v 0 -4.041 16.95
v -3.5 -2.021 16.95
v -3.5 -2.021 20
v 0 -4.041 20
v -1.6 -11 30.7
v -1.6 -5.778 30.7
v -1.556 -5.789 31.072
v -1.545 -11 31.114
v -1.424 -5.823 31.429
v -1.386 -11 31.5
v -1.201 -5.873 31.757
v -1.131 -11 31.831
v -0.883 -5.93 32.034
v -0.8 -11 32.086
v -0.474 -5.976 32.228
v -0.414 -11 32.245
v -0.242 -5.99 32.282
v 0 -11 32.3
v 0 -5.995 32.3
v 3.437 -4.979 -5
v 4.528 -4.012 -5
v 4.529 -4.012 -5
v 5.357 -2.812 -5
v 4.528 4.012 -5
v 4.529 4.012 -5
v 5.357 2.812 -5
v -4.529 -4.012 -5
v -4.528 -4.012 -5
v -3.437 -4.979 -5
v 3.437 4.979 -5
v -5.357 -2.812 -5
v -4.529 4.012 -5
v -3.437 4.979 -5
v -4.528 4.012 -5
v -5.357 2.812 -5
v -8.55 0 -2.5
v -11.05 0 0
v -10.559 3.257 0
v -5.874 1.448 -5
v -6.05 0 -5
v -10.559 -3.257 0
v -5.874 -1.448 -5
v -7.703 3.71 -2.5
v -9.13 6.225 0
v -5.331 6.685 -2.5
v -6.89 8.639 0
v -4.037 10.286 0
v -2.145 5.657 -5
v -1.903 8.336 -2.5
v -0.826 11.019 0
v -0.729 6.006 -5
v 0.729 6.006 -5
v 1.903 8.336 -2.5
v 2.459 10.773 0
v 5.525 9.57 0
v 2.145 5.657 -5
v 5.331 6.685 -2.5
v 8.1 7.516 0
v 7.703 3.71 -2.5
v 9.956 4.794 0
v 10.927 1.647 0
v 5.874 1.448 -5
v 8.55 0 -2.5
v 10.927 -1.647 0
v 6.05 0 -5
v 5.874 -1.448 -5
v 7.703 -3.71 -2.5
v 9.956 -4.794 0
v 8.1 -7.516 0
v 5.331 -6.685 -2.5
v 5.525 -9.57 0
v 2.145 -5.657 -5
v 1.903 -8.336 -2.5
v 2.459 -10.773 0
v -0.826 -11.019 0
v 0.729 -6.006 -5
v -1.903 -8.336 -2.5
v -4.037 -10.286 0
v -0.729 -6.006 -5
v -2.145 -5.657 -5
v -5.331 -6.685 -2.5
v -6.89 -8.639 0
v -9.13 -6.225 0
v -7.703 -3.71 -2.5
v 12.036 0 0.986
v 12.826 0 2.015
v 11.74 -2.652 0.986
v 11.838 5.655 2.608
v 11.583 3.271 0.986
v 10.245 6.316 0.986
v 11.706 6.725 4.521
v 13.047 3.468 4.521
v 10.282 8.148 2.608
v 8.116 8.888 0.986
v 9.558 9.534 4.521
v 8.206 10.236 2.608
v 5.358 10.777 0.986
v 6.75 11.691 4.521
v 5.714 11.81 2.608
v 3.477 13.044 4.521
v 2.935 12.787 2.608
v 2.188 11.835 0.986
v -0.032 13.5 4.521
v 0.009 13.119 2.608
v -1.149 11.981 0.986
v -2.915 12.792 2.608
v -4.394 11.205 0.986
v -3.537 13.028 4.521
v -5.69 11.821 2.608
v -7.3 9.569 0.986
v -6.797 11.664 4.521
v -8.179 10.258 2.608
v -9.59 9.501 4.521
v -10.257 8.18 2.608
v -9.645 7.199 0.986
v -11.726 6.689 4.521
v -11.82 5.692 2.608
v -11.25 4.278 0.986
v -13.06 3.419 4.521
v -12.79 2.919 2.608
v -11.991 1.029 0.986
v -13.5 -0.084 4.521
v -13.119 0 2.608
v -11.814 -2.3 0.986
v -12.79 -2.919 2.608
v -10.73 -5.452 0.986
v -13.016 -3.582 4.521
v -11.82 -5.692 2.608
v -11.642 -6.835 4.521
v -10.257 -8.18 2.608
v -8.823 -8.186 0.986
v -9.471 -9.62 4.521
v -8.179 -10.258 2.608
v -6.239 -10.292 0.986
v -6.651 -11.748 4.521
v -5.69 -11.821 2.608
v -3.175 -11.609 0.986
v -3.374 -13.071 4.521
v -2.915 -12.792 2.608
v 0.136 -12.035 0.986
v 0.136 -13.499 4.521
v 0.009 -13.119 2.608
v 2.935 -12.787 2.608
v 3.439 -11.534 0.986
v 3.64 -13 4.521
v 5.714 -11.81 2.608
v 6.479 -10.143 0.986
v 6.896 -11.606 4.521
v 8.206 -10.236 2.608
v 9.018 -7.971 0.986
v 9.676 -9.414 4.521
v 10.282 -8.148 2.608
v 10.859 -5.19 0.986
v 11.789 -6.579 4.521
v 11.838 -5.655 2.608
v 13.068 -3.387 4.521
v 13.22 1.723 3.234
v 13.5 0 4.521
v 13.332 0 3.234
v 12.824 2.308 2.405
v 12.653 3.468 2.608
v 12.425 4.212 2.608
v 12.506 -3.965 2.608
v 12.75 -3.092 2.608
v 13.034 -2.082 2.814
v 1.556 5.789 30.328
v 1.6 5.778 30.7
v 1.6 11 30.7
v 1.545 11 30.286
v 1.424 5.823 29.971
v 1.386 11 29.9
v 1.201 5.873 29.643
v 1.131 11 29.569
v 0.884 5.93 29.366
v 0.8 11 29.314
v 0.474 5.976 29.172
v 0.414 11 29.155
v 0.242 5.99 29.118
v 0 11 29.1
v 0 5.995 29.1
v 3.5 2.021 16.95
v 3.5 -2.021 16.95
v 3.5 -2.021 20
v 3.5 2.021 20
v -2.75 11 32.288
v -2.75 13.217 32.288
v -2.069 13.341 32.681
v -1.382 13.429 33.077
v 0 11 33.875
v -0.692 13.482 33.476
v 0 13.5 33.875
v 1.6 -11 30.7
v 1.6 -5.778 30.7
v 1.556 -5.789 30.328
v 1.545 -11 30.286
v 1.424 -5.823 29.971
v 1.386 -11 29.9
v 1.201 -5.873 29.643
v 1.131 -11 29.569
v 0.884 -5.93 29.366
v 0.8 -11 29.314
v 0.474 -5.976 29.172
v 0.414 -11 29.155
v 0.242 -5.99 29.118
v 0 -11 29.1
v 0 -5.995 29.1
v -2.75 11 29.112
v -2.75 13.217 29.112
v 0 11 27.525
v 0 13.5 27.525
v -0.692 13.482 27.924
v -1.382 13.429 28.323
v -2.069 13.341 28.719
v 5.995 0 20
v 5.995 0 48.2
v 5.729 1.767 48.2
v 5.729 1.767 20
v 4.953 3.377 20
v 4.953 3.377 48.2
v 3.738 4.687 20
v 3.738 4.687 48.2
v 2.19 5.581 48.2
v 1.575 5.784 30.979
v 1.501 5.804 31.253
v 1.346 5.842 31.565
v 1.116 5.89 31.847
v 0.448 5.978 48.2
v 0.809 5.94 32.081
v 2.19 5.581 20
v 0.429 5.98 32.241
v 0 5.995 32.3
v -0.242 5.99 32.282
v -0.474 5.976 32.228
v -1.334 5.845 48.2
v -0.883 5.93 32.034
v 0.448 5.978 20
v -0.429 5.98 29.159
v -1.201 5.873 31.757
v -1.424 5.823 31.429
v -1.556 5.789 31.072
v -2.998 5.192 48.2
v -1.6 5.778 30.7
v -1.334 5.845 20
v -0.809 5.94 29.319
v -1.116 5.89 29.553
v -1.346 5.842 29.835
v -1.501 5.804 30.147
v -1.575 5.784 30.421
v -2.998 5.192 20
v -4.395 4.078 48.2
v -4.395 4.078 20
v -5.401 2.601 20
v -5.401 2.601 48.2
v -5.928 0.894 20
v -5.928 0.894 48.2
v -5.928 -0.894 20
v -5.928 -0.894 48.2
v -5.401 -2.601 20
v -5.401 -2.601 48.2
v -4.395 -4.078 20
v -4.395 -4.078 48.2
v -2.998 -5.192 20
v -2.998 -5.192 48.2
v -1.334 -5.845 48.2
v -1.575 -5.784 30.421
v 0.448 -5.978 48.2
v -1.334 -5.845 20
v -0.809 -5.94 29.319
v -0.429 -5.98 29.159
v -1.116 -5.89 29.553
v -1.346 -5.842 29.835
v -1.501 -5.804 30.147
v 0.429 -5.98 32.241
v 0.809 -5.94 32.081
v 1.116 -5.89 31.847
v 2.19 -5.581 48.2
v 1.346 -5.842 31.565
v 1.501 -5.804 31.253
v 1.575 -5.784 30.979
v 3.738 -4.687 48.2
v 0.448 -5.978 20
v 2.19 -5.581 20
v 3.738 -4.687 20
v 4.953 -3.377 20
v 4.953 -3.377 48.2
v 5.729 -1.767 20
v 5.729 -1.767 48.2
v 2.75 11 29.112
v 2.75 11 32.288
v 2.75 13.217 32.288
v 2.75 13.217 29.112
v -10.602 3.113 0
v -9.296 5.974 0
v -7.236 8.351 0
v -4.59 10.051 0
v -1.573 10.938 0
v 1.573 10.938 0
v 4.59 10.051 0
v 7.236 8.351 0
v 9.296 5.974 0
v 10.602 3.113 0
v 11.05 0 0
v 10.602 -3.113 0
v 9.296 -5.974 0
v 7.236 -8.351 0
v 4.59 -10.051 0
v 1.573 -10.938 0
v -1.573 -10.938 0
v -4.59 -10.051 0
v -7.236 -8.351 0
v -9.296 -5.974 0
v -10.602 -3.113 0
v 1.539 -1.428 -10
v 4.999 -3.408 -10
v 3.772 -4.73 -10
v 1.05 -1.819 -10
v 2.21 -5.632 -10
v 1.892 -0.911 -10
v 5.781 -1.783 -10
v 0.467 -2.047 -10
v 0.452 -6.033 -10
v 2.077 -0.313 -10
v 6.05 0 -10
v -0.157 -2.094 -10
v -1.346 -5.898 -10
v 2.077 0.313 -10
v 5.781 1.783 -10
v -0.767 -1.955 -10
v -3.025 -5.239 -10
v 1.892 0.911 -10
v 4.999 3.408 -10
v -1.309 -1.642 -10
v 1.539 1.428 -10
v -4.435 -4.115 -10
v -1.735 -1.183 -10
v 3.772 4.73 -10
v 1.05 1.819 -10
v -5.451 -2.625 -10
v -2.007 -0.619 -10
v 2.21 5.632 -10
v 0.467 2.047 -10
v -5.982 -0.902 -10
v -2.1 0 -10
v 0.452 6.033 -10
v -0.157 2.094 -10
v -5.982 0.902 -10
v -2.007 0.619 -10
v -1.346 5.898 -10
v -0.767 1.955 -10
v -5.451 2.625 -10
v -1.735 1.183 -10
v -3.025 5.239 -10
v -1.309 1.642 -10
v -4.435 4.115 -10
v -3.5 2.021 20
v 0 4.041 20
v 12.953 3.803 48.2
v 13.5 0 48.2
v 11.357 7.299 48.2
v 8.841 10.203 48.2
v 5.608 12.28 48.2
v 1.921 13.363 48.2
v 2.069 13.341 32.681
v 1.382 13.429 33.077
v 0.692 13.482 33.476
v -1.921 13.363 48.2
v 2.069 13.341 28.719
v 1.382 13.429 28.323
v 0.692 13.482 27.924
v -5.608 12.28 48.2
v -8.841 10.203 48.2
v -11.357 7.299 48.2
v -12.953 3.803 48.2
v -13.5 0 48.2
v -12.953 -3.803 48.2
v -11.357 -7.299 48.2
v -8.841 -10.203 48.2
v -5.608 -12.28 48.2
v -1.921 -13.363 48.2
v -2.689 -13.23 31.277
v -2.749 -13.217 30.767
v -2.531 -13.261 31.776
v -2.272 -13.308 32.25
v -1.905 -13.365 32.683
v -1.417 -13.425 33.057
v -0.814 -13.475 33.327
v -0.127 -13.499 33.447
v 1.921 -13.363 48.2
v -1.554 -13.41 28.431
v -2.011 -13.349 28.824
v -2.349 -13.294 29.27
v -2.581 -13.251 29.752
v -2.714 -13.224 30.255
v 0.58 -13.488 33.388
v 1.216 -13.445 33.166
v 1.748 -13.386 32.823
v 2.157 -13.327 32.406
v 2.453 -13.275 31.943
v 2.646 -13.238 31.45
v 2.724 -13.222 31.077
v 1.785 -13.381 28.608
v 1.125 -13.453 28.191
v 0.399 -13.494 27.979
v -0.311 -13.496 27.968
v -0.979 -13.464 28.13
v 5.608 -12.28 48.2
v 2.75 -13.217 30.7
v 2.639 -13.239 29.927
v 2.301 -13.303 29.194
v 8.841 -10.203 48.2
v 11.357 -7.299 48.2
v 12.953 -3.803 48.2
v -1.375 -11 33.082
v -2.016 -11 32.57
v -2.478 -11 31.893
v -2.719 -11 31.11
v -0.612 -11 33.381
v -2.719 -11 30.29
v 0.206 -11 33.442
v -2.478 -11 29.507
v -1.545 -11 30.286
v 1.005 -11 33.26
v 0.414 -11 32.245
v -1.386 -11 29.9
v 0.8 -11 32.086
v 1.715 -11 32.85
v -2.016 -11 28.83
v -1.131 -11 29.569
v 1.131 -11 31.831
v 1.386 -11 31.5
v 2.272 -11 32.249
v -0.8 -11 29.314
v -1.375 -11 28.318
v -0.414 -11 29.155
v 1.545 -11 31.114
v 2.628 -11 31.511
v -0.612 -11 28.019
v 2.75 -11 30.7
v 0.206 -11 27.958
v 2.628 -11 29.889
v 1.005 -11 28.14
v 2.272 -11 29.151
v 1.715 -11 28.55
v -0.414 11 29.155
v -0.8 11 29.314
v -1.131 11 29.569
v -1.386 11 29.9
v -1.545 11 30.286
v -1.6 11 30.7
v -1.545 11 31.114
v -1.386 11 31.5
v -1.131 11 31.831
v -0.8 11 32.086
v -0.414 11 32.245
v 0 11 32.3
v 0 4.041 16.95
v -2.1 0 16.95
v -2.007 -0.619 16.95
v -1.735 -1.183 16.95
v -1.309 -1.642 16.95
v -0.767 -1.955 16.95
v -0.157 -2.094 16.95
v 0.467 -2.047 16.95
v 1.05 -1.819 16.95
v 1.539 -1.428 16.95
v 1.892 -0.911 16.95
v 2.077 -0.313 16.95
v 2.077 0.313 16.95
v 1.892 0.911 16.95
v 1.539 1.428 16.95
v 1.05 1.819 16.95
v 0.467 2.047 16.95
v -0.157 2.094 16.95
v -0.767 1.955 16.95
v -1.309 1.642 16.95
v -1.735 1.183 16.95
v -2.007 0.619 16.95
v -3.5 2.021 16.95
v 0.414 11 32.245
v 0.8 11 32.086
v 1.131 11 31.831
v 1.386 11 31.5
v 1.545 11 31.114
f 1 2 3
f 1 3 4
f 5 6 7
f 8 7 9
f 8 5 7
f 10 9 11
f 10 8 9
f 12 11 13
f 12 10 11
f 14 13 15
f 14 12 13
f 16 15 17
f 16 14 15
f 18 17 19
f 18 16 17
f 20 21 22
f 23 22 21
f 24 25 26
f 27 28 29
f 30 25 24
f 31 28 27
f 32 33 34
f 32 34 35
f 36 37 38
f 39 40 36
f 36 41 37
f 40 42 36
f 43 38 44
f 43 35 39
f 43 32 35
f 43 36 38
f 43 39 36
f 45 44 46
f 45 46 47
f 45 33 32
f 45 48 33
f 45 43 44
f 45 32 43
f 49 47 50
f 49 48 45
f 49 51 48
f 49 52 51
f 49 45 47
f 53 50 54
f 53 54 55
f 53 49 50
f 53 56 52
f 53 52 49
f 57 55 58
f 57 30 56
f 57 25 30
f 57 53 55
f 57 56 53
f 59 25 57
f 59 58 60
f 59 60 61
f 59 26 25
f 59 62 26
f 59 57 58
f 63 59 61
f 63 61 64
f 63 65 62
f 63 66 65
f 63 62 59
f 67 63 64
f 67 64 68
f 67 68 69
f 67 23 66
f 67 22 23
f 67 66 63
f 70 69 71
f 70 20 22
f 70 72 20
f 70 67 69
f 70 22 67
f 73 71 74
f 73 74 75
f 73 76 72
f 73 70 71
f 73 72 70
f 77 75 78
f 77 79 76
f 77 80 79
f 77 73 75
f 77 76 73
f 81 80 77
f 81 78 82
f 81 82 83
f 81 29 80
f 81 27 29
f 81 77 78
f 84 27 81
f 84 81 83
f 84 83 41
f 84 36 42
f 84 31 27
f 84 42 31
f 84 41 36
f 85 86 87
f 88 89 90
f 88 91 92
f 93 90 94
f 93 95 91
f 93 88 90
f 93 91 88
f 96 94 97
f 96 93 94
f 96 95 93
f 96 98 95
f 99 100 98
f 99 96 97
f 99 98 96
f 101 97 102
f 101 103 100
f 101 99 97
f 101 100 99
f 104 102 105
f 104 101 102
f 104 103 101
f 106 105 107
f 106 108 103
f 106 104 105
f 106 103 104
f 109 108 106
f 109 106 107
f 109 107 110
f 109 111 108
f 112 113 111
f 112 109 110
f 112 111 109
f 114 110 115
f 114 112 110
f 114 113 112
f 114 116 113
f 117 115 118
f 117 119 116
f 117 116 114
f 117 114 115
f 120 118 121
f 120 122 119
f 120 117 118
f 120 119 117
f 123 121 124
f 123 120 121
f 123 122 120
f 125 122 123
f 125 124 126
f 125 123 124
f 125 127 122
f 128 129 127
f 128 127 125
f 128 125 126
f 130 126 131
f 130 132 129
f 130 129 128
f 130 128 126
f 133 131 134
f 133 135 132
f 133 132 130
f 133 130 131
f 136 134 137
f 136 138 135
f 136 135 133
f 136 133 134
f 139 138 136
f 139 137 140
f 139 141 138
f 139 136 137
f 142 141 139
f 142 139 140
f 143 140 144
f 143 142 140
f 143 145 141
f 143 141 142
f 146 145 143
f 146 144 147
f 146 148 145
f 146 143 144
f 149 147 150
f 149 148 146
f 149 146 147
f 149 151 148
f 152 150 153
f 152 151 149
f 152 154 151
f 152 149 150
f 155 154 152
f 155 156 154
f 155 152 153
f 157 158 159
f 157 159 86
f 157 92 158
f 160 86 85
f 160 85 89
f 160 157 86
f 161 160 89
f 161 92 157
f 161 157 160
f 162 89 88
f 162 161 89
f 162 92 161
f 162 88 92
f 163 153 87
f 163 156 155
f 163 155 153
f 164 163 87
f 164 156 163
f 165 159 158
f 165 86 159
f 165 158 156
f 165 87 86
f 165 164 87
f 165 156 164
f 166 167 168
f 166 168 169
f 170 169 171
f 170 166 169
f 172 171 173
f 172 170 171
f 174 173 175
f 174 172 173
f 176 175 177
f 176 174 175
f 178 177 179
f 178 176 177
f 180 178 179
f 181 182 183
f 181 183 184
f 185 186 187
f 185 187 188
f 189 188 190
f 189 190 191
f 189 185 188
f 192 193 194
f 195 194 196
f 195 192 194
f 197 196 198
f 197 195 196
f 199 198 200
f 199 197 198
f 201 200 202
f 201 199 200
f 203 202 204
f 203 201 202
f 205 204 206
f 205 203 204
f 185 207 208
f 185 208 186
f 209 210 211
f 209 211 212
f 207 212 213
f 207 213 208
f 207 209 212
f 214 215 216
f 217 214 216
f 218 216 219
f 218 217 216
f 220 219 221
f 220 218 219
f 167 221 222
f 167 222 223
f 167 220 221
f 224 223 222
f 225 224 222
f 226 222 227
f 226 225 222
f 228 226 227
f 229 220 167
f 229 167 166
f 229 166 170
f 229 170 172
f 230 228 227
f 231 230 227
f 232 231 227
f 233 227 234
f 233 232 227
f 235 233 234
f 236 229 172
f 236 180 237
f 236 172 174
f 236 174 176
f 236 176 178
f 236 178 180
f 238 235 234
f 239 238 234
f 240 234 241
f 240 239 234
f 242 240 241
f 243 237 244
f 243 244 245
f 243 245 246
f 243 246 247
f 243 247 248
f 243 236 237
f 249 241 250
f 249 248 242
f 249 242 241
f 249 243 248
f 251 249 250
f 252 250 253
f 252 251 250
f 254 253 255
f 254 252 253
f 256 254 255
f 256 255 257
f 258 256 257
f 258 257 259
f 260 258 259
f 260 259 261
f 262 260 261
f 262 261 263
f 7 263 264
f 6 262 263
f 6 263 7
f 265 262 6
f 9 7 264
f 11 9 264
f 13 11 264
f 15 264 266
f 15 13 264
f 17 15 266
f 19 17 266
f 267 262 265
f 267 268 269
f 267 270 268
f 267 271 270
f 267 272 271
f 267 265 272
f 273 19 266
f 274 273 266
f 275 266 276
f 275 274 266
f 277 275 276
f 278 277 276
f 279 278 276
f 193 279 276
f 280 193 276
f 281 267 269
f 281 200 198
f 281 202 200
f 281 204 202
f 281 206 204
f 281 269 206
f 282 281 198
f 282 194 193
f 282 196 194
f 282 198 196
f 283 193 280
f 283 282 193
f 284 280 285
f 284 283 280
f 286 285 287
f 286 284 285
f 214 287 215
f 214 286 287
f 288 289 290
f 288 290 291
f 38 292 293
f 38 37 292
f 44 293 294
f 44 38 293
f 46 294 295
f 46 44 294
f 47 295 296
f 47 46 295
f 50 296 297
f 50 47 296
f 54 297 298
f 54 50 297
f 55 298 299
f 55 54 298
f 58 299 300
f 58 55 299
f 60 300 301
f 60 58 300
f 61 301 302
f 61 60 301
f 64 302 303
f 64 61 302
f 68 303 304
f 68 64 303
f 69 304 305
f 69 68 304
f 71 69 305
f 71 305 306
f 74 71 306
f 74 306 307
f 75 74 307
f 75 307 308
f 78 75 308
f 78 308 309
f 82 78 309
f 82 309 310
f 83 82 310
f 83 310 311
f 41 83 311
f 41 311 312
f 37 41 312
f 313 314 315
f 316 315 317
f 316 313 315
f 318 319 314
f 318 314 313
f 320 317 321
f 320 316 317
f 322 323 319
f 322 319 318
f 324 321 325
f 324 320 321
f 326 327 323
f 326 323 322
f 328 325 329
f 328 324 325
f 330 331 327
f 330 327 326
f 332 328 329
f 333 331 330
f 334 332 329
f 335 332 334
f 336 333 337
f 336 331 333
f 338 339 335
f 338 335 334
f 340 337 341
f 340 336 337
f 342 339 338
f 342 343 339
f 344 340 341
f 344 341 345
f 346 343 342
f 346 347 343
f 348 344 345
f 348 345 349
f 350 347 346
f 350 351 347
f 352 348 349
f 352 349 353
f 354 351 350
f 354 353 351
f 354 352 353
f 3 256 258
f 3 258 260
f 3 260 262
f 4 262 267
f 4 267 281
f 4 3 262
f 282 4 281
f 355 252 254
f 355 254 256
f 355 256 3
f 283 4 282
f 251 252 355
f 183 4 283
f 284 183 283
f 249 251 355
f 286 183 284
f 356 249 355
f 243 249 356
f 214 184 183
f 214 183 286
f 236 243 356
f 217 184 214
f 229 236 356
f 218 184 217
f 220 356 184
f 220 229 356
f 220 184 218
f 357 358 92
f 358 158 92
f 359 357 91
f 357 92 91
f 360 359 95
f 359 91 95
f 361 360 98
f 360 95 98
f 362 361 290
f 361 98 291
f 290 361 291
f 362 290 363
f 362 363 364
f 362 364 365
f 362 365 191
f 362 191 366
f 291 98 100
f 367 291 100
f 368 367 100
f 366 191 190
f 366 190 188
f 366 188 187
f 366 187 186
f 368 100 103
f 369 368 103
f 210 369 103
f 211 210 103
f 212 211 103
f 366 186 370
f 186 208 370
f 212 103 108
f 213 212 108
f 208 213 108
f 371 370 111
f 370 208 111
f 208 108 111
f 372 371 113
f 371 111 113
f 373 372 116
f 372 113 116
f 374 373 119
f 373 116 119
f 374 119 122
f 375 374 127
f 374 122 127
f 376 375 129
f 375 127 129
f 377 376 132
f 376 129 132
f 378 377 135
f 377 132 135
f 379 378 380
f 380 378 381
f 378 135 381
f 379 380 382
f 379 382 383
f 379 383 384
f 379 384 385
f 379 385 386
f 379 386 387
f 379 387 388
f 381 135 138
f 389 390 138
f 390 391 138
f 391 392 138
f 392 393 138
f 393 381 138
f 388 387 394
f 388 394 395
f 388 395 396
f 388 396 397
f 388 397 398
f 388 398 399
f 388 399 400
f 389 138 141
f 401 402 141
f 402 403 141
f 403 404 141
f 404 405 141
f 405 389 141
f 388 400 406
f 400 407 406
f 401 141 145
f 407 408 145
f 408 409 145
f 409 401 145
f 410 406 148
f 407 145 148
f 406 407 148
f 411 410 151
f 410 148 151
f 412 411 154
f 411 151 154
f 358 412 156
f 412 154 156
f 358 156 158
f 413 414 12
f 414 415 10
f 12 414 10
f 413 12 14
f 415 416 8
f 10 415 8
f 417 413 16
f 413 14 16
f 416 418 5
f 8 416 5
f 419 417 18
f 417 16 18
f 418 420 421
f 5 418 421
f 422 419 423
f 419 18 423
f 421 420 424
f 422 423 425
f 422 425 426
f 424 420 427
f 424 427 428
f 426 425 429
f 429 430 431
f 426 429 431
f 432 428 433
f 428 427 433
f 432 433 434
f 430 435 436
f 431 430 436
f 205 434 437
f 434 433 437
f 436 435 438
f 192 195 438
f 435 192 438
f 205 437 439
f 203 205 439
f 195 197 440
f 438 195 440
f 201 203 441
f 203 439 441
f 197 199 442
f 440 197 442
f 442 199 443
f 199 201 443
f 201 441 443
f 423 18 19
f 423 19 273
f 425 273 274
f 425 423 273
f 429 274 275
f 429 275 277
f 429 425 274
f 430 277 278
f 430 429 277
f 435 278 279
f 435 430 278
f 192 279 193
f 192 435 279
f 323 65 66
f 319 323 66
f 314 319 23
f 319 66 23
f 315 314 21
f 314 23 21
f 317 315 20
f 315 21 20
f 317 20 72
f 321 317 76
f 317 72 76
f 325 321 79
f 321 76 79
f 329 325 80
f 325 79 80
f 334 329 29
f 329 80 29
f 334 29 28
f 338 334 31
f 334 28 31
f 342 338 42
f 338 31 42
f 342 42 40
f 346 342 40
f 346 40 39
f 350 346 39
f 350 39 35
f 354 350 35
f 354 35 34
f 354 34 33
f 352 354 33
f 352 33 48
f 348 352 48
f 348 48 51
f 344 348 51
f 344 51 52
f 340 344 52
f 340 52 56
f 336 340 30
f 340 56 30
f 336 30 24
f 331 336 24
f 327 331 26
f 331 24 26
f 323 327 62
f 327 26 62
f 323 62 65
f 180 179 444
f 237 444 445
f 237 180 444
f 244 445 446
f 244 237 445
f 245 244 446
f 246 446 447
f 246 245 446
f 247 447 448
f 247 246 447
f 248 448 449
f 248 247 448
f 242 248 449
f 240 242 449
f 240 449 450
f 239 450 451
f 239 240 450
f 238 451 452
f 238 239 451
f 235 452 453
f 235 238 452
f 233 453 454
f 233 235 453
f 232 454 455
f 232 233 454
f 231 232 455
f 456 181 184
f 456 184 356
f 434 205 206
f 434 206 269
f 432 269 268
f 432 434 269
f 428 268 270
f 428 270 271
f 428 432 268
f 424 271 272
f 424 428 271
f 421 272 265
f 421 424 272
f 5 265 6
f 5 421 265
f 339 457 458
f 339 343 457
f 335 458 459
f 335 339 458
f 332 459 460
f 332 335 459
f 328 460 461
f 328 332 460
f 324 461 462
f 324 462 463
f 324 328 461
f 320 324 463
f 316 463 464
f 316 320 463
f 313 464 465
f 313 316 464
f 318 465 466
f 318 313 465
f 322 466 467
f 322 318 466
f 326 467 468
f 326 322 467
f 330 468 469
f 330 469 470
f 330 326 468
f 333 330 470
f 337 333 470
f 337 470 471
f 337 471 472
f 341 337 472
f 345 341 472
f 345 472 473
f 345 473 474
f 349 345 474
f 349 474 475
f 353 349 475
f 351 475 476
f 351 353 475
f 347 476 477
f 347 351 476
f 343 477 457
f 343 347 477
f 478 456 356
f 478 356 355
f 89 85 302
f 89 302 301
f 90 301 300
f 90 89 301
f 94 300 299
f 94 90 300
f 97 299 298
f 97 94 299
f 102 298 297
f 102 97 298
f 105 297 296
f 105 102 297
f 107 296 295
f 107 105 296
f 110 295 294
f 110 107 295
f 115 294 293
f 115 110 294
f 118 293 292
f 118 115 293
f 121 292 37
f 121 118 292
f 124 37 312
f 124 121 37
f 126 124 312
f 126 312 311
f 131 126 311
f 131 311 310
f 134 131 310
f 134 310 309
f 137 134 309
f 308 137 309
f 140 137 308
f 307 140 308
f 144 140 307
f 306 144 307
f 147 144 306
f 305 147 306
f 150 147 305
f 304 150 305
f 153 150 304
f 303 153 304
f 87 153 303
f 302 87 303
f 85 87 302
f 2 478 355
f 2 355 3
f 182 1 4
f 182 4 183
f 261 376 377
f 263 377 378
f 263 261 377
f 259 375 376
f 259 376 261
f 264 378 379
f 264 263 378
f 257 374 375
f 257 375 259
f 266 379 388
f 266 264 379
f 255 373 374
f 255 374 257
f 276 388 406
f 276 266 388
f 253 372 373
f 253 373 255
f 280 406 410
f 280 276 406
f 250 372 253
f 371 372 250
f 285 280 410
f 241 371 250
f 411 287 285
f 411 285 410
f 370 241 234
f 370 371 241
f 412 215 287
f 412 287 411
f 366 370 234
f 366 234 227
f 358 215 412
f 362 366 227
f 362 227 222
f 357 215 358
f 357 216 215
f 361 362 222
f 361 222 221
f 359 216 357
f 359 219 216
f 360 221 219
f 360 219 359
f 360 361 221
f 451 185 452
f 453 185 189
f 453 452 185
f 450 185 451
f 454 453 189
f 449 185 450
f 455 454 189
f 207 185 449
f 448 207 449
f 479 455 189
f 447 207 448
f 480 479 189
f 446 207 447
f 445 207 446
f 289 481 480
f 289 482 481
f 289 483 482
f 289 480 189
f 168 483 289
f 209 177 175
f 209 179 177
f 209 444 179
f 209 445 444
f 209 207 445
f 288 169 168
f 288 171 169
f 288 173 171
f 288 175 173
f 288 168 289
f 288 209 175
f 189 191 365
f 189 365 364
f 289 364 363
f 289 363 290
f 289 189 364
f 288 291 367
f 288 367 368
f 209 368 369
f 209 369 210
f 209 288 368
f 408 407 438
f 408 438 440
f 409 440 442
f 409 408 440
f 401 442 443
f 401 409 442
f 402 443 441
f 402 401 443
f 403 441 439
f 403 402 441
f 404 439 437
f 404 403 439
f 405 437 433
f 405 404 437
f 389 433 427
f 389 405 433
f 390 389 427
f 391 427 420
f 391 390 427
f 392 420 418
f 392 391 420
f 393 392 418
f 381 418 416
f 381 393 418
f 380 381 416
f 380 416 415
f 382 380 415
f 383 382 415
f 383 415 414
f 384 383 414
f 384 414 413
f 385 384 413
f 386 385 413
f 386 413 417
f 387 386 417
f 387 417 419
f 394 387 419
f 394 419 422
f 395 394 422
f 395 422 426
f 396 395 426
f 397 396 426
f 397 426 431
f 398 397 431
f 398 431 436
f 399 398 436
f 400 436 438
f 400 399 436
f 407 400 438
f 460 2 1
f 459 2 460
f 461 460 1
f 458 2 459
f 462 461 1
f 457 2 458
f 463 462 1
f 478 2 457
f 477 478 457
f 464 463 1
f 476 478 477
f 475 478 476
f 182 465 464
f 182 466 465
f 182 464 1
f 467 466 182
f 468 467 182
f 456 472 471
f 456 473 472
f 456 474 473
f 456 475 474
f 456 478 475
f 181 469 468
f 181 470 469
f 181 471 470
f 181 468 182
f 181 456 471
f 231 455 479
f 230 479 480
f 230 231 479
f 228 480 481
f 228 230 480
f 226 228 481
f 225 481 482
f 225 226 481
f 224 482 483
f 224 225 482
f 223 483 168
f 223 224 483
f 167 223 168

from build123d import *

# Parameters (mm, degrees)
SKETCH1_R                 = 11.05
SKETCH1_R_2               = 6.05
BOSS_EXTRUDE1_DEPTH       = 10
SKETCH2_R                 = 6.05
BOSS_EXTRUDE2_DEPTH       = 15
BOSS_EXTRUDE3_START       = 5
SKETCH3_R                 = 11.05
BOSS_EXTRUDE3_DEPTH       = 5
CHAMFER1_SIZE             = 5
SKETCH4_R                 = 6.05
SKETCH4_R_2               = 5.995
BOSS_EXTRUDE4_DEPTH       = 10
SKETCH5_R                 = 11.05
SKETCH5_R_2               = 5.995
BOSS_EXTRUDE5_DEPTH       = 28.2
SKETCH6_R                 = 11.05
BOSS_EXTRUDE6_DEPTH       = 18.2
CUT_EXTRUDE1_DEPTH        = 2.5
SKETCH8_R                 = 2.1
CUT_EXTRUDE2_DEPTH        = 56.44767804
SKETCH9_R                 = 2.8
CUT_EXTRUDE3_DEPTH        = 3.2
CUT_EXTRUDE4_START        = -3.2
SKETCH10_R                = 6.05
CUT_EXTRUDE4_DEPTH        = 3.2
CUT_EXTRUDE5_START        = -1.8
SKETCH11_R                = 6.05
CUT_EXTRUDE5_DEPTH        = 1.8
CUT_EXTRUDE6_DEPTH        = 42.272811874
CUT_EXTRUDE6_DEPTH_BACK   = 42.272811874
CUT_EXTRUDE7_START        = 8.5
CUT_EXTRUDE7_OUTLINE_R    = 1.6
CUT_EXTRUDE7_DEPTH        = 2.55
CUT_EXTRUDE8_START        = -11.050000102
CUT_EXTRUDE8_OUTLINE_R    = 2.75
CUT_EXTRUDE8_OUTLINE_R_2  = 1.6
CUT_EXTRUDE8_DEPTH        = 2.550000102
BOSS_EXTRUDE8_REACH       = 52.67
SKETCH15_R                = 13.5
SKETCH15_R_2              = 5.995
CUT_EXTRUDE9_DEPTH        = 43.705269085
CUT_EXTRUDE9_DEPTH_BACK   = 43.705269085
CUT_EXTRUDE10_START       = 11
CUT_EXTRUDE10_OUTLINE_R   = 1.6
CUT_EXTRUDE10_DEPTH       = 2.5
CUT_EXTRUDE11_START       = -13.500000102
CUT_EXTRUDE11_OUTLINE_R   = 2.75
CUT_EXTRUDE11_OUTLINE_R_2 = 1.6
CUT_EXTRUDE11_DEPTH       = 2.500000102
FILLET3_R                 = 5
SKETCH16_R                = 13.5
SKETCH16_R_2              = 5.995
BOSS_EXTRUDE9_DEPTH       = 10
SKETCH17_R                = 5.995
BOSS_EXTRUDE10_DEPTH      = 1.8
SKETCH19_R                = 2.1
BOSS_EXTRUDE12_DEPTH      = 1.25


# Read off the part's stored shape, not the designer's step: Cut-Extrude7, Cut-Extrude8, Cut-Extrude10, Cut-Extrude11
with BuildPart() as part:
    # Sketch1 → Boss-Extrude1 (new body)
    with BuildSketch(Plane.XY):
        Circle(SKETCH1_R)
        Circle(SKETCH1_R_2, mode=Mode.SUBTRACT)
    extrude(amount=BOSS_EXTRUDE1_DEPTH)



with BuildPart() as body_2:
    # Sketch2 → Boss-Extrude2 (new body)
    with BuildSketch(Plane(origin=(0, 0, 0), x_dir=(-1, 0, 0), z_dir=(0, 0, -1))):
        with Locations(Location((0, 0, 0), (0, 0, 180))):
            Circle(SKETCH2_R)
    extrude(amount=BOSS_EXTRUDE2_DEPTH)


with BuildPart() as part_1:
    add(part.part)

    add(body_2.part)  # Boss-Extrude3 merges body 2
    # Sketch3 → Boss-Extrude3 (add)
    with BuildSketch(Plane(origin=(0, 0, 0), x_dir=(-1, 0, 0), z_dir=(0, 0, -1)).offset(BOSS_EXTRUDE3_START)):
        Circle(SKETCH3_R)
    extrude(amount=-BOSS_EXTRUDE3_DEPTH)

    # Chamfer1
    chamfer1_edges = [part_1.edges().sort_by_distance(p)[0] for p in [
        (11.05, 0, -5),
    ]]
    chamfer(chamfer1_edges, length=CHAMFER1_SIZE - 0.0001)  # a hair under: the kernel refuses the full size

    # Sketch4 → Boss-Extrude4 (add)
    with BuildSketch(Plane.XY.offset(10)):
        with Locations(Location((0, 0, 0), (0, 0, 180))):
            Circle(SKETCH4_R)
        Circle(SKETCH4_R_2, mode=Mode.SUBTRACT)
    extrude(amount=-BOSS_EXTRUDE4_DEPTH)

    # Sketch5 → Boss-Extrude5 (add)
    with BuildSketch(Plane.XY.offset(10)):
        with Locations(Location((0, 0, 0), (0, 0, 180))):
            Circle(SKETCH5_R)
        Circle(SKETCH5_R_2, mode=Mode.SUBTRACT)
    extrude(amount=BOSS_EXTRUDE5_DEPTH)

    # Sketch6 → Boss-Extrude6 (add)
    with BuildSketch(Plane.XY):
        with Locations(Location((0, 0, 0), (0, 0, 180))):
            Circle(SKETCH6_R)
    extrude(amount=BOSS_EXTRUDE6_DEPTH)

    # Sketch7 → Cut-Extrude1 (cut)
    with BuildSketch(Plane.XY.offset(18.2)):
        Polygon((0, 4.041451884), (-3.5, 2.020725942), (-3.5, -2.020725942), (0, -4.041451884), (3.5, -2.020725942), (3.5, 2.020725942), align=None)
    extrude(amount=-CUT_EXTRUDE1_DEPTH, mode=Mode.SUBTRACT)

    # Sketch8 → Cut-Extrude2 (cut, through all)
    with BuildSketch(Plane(origin=(0, 0, -15), x_dir=(-1, 0, 0), z_dir=(0, 0, -1))):
        Circle(SKETCH8_R)
    extrude(amount=-CUT_EXTRUDE2_DEPTH, mode=Mode.SUBTRACT)

    # Sketch9 → Cut-Extrude3 (cut)
    with BuildSketch(Plane(origin=(0, 0, -15), x_dir=(-1, 0, 0), z_dir=(0, 0, -1))):
        Circle(SKETCH9_R)
    extrude(amount=-CUT_EXTRUDE3_DEPTH, mode=Mode.SUBTRACT)

    # Sketch10 → Cut-Extrude4 (cut)
    with BuildSketch(Plane(origin=(0, 0, -15), x_dir=(-1, 0, 0), z_dir=(0, 0, -1)).offset(CUT_EXTRUDE4_START)):
        Circle(SKETCH10_R)
    extrude(amount=CUT_EXTRUDE4_DEPTH, mode=Mode.SUBTRACT)

    # Sketch11 → Cut-Extrude5 (cut)
    with BuildSketch(Plane(origin=(0, 0, -11.8), x_dir=(-1, 0, 0), z_dir=(0, 0, -1)).offset(CUT_EXTRUDE5_START)):
        Circle(SKETCH11_R)
    extrude(amount=CUT_EXTRUDE5_DEPTH, mode=Mode.SUBTRACT)

    # Sketch12 → Cut-Extrude6 (cut, two sides: drawn at the far end of the back side and taken through both)
    with BuildSketch(Plane(origin=(0, 0, 0), x_dir=(1, 0, 0), z_dir=(0, 1, 0)).offset(-CUT_EXTRUDE6_DEPTH_BACK)):
        with BuildLine():
            ThreePointArc((-1.6, -30.7), (-1.13137085, -31.83137085), (0, -32.3))
            Line((0, -32.3), (0, -30.7))
            Line((0, -30.7), (-1.6, -30.7))
        make_face()
        with BuildLine():
            Line((0, -30.7), (0, -32.3))
            ThreePointArc((0, -32.3), (1.13137085, -31.83137085), (1.6, -30.7))
            Line((1.6, -30.7), (0, -30.7))
        make_face()
        with BuildLine():
            ThreePointArc((0, -29.1), (-1.13137085, -29.56862915), (-1.6, -30.7))
            Line((-1.6, -30.7), (0, -30.7))
            Line((0, -30.7), (0, -29.1))
        make_face()
        with BuildLine():
            Line((0, -29.1), (0, -30.7))
            Line((0, -30.7), (1.6, -30.7))
            ThreePointArc((1.6, -30.7), (1.13137085, -29.56862915), (0, -29.1))
        make_face()
    extrude(amount=CUT_EXTRUDE6_DEPTH + CUT_EXTRUDE6_DEPTH_BACK, mode=Mode.SUBTRACT)

    # Cut-Extrude7 outline → Cut-Extrude7 (cut)
    with BuildSketch(Plane(origin=(0, 0, 0), x_dir=(1, 0, 0), z_dir=(0, 1, 0)).offset(CUT_EXTRUDE7_START)):
        Polygon((2.75, -29.11228676), (0, -27.524573519), (-2.75, -29.11228676), (-2.75, -32.28771324), (0, -33.875426481), (2.75, -32.28771324), align=None)
        with Locations((0, -30.7)):
            Circle(CUT_EXTRUDE7_OUTLINE_R, mode=Mode.SUBTRACT)
    extrude(amount=CUT_EXTRUDE7_DEPTH, mode=Mode.SUBTRACT)

    # Cut-Extrude8 outline → Cut-Extrude8 (cut)
    with BuildSketch(Plane(origin=(0, 0, 0), x_dir=(1, 0, 0), z_dir=(0, 1, 0)).offset(CUT_EXTRUDE8_START)):
        with Locations((0, -30.7)):
            Circle(CUT_EXTRUDE8_OUTLINE_R)
        with Locations((0, -30.7)):
            Circle(CUT_EXTRUDE8_OUTLINE_R_2, mode=Mode.SUBTRACT)
    extrude(amount=CUT_EXTRUDE8_DEPTH, mode=Mode.SUBTRACT)

    # Boss-Extrude8: up to this cone (the profile starts inside it)
    boss_extrude8_end = Plane(origin=(0, 0, 38.2), z_dir=(0, 0, 1)).offset(-49.249999) * Cone(1e-06, 151.67, 151.669999, align=(Align.CENTER, Align.CENTER, Align.MIN), mode=Mode.PRIVATE)
    # Sketch15 → Boss-Extrude8 (add, up to the surface)
    with BuildSketch(Plane.XY.offset(38.2), mode=Mode.PRIVATE) as boss_extrude8_sk1:
        Circle(SKETCH15_R)
        Circle(SKETCH15_R_2, mode=Mode.SUBTRACT)
    boss_extrude8_tool1 = extrude(boss_extrude8_sk1.sketch, amount=-BOSS_EXTRUDE8_REACH, mode=Mode.PRIVATE) & boss_extrude8_end
    add(boss_extrude8_tool1.solids().sort_by_distance((-13.118162, 0, 38.2))[0])

    # Sketch12<4> → Cut-Extrude9 (cut, two sides: drawn at the far end of the back side and taken through both)
    with BuildSketch(Plane(origin=(0, 0, 0), x_dir=(1, 0, 0), z_dir=(0, 1, 0)).offset(-CUT_EXTRUDE9_DEPTH_BACK)):
        with BuildLine():
            ThreePointArc((-1.6, -30.7), (-1.13137085, -31.83137085), (0, -32.3))
            Line((0, -32.3), (0, -30.7))
            Line((0, -30.7), (-1.6, -30.7))
        make_face()
        with BuildLine():
            Line((0, -30.7), (0, -32.3))
            ThreePointArc((0, -32.3), (1.13137085, -31.83137085), (1.6, -30.7))
            Line((1.6, -30.7), (0, -30.7))
        make_face()
        with BuildLine():
            ThreePointArc((0, -29.1), (-1.13137085, -29.56862915), (-1.6, -30.7))
            Line((-1.6, -30.7), (0, -30.7))
            Line((0, -30.7), (0, -29.1))
        make_face()
        with BuildLine():
            Line((0, -29.1), (0, -30.7))
            Line((0, -30.7), (1.6, -30.7))
            ThreePointArc((1.6, -30.7), (1.13137085, -29.56862915), (0, -29.1))
        make_face()
    extrude(amount=CUT_EXTRUDE9_DEPTH + CUT_EXTRUDE9_DEPTH_BACK, mode=Mode.SUBTRACT)

    # Cut-Extrude10 outline → Cut-Extrude10 (cut)
    with BuildSketch(Plane(origin=(0, 0, 0), x_dir=(1, 0, 0), z_dir=(0, 1, 0)).offset(CUT_EXTRUDE10_START)):
        Polygon((-2.75, -32.28771324), (0, -33.875426481), (2.75, -32.28771324), (2.75, -29.11228676), (0, -27.524573519), (-2.75, -29.11228676), align=None)
        with Locations((0, -30.7)):
            Circle(CUT_EXTRUDE10_OUTLINE_R, mode=Mode.SUBTRACT)
    extrude(amount=CUT_EXTRUDE10_DEPTH, mode=Mode.SUBTRACT)

    # Cut-Extrude11 outline → Cut-Extrude11 (cut)
    with BuildSketch(Plane(origin=(0, 0, 0), x_dir=(1, 0, 0), z_dir=(0, 1, 0)).offset(CUT_EXTRUDE11_START)):
        with Locations((0, -30.7)):
            Circle(CUT_EXTRUDE11_OUTLINE_R)
        with Locations((0, -30.7)):
            Circle(CUT_EXTRUDE11_OUTLINE_R_2, mode=Mode.SUBTRACT)
    extrude(amount=CUT_EXTRUDE11_DEPTH, mode=Mode.SUBTRACT)

    # Fillet3
    fillet3_edges = [part_1.edges().sort_by_distance(p)[0] for p in [
        (-13.5, 0, 2.45),
    ]]
    fillet(fillet3_edges, radius=FILLET3_R)

    # Sketch16 → Boss-Extrude9 (add)
    with BuildSketch(Plane.XY.offset(38.2)):
        Circle(SKETCH16_R)
        Circle(SKETCH16_R_2, mode=Mode.SUBTRACT)
    extrude(amount=BOSS_EXTRUDE9_DEPTH)

    # Sketch17 → Boss-Extrude10 (add)
    with BuildSketch(Plane.XY.offset(18.2)):
        Circle(SKETCH17_R)
        Polygon((0, 4.041451884), (-3.5, 2.020725942), (-3.5, -2.020725942), (0, -4.041451884), (3.5, -2.020725942), (3.5, 2.020725942), align=None, mode=Mode.SUBTRACT)
    extrude(amount=BOSS_EXTRUDE10_DEPTH)

    # Sketch19 → Boss-Extrude12 (add)
    with BuildSketch(Plane.XY.offset(15.7)):
        Polygon((0, 4.041451884), (-3.5, 2.020725942), (-3.5, -2.020725942), (0, -4.041451884), (3.5, -2.020725942), (3.5, 2.020725942), align=None)
        with Locations(Location((0, 0, 0), (0, 0, 180))):
            Circle(SKETCH19_R, mode=Mode.SUBTRACT)
    extrude(amount=BOSS_EXTRUDE12_DEPTH)


solid = part_1.part
